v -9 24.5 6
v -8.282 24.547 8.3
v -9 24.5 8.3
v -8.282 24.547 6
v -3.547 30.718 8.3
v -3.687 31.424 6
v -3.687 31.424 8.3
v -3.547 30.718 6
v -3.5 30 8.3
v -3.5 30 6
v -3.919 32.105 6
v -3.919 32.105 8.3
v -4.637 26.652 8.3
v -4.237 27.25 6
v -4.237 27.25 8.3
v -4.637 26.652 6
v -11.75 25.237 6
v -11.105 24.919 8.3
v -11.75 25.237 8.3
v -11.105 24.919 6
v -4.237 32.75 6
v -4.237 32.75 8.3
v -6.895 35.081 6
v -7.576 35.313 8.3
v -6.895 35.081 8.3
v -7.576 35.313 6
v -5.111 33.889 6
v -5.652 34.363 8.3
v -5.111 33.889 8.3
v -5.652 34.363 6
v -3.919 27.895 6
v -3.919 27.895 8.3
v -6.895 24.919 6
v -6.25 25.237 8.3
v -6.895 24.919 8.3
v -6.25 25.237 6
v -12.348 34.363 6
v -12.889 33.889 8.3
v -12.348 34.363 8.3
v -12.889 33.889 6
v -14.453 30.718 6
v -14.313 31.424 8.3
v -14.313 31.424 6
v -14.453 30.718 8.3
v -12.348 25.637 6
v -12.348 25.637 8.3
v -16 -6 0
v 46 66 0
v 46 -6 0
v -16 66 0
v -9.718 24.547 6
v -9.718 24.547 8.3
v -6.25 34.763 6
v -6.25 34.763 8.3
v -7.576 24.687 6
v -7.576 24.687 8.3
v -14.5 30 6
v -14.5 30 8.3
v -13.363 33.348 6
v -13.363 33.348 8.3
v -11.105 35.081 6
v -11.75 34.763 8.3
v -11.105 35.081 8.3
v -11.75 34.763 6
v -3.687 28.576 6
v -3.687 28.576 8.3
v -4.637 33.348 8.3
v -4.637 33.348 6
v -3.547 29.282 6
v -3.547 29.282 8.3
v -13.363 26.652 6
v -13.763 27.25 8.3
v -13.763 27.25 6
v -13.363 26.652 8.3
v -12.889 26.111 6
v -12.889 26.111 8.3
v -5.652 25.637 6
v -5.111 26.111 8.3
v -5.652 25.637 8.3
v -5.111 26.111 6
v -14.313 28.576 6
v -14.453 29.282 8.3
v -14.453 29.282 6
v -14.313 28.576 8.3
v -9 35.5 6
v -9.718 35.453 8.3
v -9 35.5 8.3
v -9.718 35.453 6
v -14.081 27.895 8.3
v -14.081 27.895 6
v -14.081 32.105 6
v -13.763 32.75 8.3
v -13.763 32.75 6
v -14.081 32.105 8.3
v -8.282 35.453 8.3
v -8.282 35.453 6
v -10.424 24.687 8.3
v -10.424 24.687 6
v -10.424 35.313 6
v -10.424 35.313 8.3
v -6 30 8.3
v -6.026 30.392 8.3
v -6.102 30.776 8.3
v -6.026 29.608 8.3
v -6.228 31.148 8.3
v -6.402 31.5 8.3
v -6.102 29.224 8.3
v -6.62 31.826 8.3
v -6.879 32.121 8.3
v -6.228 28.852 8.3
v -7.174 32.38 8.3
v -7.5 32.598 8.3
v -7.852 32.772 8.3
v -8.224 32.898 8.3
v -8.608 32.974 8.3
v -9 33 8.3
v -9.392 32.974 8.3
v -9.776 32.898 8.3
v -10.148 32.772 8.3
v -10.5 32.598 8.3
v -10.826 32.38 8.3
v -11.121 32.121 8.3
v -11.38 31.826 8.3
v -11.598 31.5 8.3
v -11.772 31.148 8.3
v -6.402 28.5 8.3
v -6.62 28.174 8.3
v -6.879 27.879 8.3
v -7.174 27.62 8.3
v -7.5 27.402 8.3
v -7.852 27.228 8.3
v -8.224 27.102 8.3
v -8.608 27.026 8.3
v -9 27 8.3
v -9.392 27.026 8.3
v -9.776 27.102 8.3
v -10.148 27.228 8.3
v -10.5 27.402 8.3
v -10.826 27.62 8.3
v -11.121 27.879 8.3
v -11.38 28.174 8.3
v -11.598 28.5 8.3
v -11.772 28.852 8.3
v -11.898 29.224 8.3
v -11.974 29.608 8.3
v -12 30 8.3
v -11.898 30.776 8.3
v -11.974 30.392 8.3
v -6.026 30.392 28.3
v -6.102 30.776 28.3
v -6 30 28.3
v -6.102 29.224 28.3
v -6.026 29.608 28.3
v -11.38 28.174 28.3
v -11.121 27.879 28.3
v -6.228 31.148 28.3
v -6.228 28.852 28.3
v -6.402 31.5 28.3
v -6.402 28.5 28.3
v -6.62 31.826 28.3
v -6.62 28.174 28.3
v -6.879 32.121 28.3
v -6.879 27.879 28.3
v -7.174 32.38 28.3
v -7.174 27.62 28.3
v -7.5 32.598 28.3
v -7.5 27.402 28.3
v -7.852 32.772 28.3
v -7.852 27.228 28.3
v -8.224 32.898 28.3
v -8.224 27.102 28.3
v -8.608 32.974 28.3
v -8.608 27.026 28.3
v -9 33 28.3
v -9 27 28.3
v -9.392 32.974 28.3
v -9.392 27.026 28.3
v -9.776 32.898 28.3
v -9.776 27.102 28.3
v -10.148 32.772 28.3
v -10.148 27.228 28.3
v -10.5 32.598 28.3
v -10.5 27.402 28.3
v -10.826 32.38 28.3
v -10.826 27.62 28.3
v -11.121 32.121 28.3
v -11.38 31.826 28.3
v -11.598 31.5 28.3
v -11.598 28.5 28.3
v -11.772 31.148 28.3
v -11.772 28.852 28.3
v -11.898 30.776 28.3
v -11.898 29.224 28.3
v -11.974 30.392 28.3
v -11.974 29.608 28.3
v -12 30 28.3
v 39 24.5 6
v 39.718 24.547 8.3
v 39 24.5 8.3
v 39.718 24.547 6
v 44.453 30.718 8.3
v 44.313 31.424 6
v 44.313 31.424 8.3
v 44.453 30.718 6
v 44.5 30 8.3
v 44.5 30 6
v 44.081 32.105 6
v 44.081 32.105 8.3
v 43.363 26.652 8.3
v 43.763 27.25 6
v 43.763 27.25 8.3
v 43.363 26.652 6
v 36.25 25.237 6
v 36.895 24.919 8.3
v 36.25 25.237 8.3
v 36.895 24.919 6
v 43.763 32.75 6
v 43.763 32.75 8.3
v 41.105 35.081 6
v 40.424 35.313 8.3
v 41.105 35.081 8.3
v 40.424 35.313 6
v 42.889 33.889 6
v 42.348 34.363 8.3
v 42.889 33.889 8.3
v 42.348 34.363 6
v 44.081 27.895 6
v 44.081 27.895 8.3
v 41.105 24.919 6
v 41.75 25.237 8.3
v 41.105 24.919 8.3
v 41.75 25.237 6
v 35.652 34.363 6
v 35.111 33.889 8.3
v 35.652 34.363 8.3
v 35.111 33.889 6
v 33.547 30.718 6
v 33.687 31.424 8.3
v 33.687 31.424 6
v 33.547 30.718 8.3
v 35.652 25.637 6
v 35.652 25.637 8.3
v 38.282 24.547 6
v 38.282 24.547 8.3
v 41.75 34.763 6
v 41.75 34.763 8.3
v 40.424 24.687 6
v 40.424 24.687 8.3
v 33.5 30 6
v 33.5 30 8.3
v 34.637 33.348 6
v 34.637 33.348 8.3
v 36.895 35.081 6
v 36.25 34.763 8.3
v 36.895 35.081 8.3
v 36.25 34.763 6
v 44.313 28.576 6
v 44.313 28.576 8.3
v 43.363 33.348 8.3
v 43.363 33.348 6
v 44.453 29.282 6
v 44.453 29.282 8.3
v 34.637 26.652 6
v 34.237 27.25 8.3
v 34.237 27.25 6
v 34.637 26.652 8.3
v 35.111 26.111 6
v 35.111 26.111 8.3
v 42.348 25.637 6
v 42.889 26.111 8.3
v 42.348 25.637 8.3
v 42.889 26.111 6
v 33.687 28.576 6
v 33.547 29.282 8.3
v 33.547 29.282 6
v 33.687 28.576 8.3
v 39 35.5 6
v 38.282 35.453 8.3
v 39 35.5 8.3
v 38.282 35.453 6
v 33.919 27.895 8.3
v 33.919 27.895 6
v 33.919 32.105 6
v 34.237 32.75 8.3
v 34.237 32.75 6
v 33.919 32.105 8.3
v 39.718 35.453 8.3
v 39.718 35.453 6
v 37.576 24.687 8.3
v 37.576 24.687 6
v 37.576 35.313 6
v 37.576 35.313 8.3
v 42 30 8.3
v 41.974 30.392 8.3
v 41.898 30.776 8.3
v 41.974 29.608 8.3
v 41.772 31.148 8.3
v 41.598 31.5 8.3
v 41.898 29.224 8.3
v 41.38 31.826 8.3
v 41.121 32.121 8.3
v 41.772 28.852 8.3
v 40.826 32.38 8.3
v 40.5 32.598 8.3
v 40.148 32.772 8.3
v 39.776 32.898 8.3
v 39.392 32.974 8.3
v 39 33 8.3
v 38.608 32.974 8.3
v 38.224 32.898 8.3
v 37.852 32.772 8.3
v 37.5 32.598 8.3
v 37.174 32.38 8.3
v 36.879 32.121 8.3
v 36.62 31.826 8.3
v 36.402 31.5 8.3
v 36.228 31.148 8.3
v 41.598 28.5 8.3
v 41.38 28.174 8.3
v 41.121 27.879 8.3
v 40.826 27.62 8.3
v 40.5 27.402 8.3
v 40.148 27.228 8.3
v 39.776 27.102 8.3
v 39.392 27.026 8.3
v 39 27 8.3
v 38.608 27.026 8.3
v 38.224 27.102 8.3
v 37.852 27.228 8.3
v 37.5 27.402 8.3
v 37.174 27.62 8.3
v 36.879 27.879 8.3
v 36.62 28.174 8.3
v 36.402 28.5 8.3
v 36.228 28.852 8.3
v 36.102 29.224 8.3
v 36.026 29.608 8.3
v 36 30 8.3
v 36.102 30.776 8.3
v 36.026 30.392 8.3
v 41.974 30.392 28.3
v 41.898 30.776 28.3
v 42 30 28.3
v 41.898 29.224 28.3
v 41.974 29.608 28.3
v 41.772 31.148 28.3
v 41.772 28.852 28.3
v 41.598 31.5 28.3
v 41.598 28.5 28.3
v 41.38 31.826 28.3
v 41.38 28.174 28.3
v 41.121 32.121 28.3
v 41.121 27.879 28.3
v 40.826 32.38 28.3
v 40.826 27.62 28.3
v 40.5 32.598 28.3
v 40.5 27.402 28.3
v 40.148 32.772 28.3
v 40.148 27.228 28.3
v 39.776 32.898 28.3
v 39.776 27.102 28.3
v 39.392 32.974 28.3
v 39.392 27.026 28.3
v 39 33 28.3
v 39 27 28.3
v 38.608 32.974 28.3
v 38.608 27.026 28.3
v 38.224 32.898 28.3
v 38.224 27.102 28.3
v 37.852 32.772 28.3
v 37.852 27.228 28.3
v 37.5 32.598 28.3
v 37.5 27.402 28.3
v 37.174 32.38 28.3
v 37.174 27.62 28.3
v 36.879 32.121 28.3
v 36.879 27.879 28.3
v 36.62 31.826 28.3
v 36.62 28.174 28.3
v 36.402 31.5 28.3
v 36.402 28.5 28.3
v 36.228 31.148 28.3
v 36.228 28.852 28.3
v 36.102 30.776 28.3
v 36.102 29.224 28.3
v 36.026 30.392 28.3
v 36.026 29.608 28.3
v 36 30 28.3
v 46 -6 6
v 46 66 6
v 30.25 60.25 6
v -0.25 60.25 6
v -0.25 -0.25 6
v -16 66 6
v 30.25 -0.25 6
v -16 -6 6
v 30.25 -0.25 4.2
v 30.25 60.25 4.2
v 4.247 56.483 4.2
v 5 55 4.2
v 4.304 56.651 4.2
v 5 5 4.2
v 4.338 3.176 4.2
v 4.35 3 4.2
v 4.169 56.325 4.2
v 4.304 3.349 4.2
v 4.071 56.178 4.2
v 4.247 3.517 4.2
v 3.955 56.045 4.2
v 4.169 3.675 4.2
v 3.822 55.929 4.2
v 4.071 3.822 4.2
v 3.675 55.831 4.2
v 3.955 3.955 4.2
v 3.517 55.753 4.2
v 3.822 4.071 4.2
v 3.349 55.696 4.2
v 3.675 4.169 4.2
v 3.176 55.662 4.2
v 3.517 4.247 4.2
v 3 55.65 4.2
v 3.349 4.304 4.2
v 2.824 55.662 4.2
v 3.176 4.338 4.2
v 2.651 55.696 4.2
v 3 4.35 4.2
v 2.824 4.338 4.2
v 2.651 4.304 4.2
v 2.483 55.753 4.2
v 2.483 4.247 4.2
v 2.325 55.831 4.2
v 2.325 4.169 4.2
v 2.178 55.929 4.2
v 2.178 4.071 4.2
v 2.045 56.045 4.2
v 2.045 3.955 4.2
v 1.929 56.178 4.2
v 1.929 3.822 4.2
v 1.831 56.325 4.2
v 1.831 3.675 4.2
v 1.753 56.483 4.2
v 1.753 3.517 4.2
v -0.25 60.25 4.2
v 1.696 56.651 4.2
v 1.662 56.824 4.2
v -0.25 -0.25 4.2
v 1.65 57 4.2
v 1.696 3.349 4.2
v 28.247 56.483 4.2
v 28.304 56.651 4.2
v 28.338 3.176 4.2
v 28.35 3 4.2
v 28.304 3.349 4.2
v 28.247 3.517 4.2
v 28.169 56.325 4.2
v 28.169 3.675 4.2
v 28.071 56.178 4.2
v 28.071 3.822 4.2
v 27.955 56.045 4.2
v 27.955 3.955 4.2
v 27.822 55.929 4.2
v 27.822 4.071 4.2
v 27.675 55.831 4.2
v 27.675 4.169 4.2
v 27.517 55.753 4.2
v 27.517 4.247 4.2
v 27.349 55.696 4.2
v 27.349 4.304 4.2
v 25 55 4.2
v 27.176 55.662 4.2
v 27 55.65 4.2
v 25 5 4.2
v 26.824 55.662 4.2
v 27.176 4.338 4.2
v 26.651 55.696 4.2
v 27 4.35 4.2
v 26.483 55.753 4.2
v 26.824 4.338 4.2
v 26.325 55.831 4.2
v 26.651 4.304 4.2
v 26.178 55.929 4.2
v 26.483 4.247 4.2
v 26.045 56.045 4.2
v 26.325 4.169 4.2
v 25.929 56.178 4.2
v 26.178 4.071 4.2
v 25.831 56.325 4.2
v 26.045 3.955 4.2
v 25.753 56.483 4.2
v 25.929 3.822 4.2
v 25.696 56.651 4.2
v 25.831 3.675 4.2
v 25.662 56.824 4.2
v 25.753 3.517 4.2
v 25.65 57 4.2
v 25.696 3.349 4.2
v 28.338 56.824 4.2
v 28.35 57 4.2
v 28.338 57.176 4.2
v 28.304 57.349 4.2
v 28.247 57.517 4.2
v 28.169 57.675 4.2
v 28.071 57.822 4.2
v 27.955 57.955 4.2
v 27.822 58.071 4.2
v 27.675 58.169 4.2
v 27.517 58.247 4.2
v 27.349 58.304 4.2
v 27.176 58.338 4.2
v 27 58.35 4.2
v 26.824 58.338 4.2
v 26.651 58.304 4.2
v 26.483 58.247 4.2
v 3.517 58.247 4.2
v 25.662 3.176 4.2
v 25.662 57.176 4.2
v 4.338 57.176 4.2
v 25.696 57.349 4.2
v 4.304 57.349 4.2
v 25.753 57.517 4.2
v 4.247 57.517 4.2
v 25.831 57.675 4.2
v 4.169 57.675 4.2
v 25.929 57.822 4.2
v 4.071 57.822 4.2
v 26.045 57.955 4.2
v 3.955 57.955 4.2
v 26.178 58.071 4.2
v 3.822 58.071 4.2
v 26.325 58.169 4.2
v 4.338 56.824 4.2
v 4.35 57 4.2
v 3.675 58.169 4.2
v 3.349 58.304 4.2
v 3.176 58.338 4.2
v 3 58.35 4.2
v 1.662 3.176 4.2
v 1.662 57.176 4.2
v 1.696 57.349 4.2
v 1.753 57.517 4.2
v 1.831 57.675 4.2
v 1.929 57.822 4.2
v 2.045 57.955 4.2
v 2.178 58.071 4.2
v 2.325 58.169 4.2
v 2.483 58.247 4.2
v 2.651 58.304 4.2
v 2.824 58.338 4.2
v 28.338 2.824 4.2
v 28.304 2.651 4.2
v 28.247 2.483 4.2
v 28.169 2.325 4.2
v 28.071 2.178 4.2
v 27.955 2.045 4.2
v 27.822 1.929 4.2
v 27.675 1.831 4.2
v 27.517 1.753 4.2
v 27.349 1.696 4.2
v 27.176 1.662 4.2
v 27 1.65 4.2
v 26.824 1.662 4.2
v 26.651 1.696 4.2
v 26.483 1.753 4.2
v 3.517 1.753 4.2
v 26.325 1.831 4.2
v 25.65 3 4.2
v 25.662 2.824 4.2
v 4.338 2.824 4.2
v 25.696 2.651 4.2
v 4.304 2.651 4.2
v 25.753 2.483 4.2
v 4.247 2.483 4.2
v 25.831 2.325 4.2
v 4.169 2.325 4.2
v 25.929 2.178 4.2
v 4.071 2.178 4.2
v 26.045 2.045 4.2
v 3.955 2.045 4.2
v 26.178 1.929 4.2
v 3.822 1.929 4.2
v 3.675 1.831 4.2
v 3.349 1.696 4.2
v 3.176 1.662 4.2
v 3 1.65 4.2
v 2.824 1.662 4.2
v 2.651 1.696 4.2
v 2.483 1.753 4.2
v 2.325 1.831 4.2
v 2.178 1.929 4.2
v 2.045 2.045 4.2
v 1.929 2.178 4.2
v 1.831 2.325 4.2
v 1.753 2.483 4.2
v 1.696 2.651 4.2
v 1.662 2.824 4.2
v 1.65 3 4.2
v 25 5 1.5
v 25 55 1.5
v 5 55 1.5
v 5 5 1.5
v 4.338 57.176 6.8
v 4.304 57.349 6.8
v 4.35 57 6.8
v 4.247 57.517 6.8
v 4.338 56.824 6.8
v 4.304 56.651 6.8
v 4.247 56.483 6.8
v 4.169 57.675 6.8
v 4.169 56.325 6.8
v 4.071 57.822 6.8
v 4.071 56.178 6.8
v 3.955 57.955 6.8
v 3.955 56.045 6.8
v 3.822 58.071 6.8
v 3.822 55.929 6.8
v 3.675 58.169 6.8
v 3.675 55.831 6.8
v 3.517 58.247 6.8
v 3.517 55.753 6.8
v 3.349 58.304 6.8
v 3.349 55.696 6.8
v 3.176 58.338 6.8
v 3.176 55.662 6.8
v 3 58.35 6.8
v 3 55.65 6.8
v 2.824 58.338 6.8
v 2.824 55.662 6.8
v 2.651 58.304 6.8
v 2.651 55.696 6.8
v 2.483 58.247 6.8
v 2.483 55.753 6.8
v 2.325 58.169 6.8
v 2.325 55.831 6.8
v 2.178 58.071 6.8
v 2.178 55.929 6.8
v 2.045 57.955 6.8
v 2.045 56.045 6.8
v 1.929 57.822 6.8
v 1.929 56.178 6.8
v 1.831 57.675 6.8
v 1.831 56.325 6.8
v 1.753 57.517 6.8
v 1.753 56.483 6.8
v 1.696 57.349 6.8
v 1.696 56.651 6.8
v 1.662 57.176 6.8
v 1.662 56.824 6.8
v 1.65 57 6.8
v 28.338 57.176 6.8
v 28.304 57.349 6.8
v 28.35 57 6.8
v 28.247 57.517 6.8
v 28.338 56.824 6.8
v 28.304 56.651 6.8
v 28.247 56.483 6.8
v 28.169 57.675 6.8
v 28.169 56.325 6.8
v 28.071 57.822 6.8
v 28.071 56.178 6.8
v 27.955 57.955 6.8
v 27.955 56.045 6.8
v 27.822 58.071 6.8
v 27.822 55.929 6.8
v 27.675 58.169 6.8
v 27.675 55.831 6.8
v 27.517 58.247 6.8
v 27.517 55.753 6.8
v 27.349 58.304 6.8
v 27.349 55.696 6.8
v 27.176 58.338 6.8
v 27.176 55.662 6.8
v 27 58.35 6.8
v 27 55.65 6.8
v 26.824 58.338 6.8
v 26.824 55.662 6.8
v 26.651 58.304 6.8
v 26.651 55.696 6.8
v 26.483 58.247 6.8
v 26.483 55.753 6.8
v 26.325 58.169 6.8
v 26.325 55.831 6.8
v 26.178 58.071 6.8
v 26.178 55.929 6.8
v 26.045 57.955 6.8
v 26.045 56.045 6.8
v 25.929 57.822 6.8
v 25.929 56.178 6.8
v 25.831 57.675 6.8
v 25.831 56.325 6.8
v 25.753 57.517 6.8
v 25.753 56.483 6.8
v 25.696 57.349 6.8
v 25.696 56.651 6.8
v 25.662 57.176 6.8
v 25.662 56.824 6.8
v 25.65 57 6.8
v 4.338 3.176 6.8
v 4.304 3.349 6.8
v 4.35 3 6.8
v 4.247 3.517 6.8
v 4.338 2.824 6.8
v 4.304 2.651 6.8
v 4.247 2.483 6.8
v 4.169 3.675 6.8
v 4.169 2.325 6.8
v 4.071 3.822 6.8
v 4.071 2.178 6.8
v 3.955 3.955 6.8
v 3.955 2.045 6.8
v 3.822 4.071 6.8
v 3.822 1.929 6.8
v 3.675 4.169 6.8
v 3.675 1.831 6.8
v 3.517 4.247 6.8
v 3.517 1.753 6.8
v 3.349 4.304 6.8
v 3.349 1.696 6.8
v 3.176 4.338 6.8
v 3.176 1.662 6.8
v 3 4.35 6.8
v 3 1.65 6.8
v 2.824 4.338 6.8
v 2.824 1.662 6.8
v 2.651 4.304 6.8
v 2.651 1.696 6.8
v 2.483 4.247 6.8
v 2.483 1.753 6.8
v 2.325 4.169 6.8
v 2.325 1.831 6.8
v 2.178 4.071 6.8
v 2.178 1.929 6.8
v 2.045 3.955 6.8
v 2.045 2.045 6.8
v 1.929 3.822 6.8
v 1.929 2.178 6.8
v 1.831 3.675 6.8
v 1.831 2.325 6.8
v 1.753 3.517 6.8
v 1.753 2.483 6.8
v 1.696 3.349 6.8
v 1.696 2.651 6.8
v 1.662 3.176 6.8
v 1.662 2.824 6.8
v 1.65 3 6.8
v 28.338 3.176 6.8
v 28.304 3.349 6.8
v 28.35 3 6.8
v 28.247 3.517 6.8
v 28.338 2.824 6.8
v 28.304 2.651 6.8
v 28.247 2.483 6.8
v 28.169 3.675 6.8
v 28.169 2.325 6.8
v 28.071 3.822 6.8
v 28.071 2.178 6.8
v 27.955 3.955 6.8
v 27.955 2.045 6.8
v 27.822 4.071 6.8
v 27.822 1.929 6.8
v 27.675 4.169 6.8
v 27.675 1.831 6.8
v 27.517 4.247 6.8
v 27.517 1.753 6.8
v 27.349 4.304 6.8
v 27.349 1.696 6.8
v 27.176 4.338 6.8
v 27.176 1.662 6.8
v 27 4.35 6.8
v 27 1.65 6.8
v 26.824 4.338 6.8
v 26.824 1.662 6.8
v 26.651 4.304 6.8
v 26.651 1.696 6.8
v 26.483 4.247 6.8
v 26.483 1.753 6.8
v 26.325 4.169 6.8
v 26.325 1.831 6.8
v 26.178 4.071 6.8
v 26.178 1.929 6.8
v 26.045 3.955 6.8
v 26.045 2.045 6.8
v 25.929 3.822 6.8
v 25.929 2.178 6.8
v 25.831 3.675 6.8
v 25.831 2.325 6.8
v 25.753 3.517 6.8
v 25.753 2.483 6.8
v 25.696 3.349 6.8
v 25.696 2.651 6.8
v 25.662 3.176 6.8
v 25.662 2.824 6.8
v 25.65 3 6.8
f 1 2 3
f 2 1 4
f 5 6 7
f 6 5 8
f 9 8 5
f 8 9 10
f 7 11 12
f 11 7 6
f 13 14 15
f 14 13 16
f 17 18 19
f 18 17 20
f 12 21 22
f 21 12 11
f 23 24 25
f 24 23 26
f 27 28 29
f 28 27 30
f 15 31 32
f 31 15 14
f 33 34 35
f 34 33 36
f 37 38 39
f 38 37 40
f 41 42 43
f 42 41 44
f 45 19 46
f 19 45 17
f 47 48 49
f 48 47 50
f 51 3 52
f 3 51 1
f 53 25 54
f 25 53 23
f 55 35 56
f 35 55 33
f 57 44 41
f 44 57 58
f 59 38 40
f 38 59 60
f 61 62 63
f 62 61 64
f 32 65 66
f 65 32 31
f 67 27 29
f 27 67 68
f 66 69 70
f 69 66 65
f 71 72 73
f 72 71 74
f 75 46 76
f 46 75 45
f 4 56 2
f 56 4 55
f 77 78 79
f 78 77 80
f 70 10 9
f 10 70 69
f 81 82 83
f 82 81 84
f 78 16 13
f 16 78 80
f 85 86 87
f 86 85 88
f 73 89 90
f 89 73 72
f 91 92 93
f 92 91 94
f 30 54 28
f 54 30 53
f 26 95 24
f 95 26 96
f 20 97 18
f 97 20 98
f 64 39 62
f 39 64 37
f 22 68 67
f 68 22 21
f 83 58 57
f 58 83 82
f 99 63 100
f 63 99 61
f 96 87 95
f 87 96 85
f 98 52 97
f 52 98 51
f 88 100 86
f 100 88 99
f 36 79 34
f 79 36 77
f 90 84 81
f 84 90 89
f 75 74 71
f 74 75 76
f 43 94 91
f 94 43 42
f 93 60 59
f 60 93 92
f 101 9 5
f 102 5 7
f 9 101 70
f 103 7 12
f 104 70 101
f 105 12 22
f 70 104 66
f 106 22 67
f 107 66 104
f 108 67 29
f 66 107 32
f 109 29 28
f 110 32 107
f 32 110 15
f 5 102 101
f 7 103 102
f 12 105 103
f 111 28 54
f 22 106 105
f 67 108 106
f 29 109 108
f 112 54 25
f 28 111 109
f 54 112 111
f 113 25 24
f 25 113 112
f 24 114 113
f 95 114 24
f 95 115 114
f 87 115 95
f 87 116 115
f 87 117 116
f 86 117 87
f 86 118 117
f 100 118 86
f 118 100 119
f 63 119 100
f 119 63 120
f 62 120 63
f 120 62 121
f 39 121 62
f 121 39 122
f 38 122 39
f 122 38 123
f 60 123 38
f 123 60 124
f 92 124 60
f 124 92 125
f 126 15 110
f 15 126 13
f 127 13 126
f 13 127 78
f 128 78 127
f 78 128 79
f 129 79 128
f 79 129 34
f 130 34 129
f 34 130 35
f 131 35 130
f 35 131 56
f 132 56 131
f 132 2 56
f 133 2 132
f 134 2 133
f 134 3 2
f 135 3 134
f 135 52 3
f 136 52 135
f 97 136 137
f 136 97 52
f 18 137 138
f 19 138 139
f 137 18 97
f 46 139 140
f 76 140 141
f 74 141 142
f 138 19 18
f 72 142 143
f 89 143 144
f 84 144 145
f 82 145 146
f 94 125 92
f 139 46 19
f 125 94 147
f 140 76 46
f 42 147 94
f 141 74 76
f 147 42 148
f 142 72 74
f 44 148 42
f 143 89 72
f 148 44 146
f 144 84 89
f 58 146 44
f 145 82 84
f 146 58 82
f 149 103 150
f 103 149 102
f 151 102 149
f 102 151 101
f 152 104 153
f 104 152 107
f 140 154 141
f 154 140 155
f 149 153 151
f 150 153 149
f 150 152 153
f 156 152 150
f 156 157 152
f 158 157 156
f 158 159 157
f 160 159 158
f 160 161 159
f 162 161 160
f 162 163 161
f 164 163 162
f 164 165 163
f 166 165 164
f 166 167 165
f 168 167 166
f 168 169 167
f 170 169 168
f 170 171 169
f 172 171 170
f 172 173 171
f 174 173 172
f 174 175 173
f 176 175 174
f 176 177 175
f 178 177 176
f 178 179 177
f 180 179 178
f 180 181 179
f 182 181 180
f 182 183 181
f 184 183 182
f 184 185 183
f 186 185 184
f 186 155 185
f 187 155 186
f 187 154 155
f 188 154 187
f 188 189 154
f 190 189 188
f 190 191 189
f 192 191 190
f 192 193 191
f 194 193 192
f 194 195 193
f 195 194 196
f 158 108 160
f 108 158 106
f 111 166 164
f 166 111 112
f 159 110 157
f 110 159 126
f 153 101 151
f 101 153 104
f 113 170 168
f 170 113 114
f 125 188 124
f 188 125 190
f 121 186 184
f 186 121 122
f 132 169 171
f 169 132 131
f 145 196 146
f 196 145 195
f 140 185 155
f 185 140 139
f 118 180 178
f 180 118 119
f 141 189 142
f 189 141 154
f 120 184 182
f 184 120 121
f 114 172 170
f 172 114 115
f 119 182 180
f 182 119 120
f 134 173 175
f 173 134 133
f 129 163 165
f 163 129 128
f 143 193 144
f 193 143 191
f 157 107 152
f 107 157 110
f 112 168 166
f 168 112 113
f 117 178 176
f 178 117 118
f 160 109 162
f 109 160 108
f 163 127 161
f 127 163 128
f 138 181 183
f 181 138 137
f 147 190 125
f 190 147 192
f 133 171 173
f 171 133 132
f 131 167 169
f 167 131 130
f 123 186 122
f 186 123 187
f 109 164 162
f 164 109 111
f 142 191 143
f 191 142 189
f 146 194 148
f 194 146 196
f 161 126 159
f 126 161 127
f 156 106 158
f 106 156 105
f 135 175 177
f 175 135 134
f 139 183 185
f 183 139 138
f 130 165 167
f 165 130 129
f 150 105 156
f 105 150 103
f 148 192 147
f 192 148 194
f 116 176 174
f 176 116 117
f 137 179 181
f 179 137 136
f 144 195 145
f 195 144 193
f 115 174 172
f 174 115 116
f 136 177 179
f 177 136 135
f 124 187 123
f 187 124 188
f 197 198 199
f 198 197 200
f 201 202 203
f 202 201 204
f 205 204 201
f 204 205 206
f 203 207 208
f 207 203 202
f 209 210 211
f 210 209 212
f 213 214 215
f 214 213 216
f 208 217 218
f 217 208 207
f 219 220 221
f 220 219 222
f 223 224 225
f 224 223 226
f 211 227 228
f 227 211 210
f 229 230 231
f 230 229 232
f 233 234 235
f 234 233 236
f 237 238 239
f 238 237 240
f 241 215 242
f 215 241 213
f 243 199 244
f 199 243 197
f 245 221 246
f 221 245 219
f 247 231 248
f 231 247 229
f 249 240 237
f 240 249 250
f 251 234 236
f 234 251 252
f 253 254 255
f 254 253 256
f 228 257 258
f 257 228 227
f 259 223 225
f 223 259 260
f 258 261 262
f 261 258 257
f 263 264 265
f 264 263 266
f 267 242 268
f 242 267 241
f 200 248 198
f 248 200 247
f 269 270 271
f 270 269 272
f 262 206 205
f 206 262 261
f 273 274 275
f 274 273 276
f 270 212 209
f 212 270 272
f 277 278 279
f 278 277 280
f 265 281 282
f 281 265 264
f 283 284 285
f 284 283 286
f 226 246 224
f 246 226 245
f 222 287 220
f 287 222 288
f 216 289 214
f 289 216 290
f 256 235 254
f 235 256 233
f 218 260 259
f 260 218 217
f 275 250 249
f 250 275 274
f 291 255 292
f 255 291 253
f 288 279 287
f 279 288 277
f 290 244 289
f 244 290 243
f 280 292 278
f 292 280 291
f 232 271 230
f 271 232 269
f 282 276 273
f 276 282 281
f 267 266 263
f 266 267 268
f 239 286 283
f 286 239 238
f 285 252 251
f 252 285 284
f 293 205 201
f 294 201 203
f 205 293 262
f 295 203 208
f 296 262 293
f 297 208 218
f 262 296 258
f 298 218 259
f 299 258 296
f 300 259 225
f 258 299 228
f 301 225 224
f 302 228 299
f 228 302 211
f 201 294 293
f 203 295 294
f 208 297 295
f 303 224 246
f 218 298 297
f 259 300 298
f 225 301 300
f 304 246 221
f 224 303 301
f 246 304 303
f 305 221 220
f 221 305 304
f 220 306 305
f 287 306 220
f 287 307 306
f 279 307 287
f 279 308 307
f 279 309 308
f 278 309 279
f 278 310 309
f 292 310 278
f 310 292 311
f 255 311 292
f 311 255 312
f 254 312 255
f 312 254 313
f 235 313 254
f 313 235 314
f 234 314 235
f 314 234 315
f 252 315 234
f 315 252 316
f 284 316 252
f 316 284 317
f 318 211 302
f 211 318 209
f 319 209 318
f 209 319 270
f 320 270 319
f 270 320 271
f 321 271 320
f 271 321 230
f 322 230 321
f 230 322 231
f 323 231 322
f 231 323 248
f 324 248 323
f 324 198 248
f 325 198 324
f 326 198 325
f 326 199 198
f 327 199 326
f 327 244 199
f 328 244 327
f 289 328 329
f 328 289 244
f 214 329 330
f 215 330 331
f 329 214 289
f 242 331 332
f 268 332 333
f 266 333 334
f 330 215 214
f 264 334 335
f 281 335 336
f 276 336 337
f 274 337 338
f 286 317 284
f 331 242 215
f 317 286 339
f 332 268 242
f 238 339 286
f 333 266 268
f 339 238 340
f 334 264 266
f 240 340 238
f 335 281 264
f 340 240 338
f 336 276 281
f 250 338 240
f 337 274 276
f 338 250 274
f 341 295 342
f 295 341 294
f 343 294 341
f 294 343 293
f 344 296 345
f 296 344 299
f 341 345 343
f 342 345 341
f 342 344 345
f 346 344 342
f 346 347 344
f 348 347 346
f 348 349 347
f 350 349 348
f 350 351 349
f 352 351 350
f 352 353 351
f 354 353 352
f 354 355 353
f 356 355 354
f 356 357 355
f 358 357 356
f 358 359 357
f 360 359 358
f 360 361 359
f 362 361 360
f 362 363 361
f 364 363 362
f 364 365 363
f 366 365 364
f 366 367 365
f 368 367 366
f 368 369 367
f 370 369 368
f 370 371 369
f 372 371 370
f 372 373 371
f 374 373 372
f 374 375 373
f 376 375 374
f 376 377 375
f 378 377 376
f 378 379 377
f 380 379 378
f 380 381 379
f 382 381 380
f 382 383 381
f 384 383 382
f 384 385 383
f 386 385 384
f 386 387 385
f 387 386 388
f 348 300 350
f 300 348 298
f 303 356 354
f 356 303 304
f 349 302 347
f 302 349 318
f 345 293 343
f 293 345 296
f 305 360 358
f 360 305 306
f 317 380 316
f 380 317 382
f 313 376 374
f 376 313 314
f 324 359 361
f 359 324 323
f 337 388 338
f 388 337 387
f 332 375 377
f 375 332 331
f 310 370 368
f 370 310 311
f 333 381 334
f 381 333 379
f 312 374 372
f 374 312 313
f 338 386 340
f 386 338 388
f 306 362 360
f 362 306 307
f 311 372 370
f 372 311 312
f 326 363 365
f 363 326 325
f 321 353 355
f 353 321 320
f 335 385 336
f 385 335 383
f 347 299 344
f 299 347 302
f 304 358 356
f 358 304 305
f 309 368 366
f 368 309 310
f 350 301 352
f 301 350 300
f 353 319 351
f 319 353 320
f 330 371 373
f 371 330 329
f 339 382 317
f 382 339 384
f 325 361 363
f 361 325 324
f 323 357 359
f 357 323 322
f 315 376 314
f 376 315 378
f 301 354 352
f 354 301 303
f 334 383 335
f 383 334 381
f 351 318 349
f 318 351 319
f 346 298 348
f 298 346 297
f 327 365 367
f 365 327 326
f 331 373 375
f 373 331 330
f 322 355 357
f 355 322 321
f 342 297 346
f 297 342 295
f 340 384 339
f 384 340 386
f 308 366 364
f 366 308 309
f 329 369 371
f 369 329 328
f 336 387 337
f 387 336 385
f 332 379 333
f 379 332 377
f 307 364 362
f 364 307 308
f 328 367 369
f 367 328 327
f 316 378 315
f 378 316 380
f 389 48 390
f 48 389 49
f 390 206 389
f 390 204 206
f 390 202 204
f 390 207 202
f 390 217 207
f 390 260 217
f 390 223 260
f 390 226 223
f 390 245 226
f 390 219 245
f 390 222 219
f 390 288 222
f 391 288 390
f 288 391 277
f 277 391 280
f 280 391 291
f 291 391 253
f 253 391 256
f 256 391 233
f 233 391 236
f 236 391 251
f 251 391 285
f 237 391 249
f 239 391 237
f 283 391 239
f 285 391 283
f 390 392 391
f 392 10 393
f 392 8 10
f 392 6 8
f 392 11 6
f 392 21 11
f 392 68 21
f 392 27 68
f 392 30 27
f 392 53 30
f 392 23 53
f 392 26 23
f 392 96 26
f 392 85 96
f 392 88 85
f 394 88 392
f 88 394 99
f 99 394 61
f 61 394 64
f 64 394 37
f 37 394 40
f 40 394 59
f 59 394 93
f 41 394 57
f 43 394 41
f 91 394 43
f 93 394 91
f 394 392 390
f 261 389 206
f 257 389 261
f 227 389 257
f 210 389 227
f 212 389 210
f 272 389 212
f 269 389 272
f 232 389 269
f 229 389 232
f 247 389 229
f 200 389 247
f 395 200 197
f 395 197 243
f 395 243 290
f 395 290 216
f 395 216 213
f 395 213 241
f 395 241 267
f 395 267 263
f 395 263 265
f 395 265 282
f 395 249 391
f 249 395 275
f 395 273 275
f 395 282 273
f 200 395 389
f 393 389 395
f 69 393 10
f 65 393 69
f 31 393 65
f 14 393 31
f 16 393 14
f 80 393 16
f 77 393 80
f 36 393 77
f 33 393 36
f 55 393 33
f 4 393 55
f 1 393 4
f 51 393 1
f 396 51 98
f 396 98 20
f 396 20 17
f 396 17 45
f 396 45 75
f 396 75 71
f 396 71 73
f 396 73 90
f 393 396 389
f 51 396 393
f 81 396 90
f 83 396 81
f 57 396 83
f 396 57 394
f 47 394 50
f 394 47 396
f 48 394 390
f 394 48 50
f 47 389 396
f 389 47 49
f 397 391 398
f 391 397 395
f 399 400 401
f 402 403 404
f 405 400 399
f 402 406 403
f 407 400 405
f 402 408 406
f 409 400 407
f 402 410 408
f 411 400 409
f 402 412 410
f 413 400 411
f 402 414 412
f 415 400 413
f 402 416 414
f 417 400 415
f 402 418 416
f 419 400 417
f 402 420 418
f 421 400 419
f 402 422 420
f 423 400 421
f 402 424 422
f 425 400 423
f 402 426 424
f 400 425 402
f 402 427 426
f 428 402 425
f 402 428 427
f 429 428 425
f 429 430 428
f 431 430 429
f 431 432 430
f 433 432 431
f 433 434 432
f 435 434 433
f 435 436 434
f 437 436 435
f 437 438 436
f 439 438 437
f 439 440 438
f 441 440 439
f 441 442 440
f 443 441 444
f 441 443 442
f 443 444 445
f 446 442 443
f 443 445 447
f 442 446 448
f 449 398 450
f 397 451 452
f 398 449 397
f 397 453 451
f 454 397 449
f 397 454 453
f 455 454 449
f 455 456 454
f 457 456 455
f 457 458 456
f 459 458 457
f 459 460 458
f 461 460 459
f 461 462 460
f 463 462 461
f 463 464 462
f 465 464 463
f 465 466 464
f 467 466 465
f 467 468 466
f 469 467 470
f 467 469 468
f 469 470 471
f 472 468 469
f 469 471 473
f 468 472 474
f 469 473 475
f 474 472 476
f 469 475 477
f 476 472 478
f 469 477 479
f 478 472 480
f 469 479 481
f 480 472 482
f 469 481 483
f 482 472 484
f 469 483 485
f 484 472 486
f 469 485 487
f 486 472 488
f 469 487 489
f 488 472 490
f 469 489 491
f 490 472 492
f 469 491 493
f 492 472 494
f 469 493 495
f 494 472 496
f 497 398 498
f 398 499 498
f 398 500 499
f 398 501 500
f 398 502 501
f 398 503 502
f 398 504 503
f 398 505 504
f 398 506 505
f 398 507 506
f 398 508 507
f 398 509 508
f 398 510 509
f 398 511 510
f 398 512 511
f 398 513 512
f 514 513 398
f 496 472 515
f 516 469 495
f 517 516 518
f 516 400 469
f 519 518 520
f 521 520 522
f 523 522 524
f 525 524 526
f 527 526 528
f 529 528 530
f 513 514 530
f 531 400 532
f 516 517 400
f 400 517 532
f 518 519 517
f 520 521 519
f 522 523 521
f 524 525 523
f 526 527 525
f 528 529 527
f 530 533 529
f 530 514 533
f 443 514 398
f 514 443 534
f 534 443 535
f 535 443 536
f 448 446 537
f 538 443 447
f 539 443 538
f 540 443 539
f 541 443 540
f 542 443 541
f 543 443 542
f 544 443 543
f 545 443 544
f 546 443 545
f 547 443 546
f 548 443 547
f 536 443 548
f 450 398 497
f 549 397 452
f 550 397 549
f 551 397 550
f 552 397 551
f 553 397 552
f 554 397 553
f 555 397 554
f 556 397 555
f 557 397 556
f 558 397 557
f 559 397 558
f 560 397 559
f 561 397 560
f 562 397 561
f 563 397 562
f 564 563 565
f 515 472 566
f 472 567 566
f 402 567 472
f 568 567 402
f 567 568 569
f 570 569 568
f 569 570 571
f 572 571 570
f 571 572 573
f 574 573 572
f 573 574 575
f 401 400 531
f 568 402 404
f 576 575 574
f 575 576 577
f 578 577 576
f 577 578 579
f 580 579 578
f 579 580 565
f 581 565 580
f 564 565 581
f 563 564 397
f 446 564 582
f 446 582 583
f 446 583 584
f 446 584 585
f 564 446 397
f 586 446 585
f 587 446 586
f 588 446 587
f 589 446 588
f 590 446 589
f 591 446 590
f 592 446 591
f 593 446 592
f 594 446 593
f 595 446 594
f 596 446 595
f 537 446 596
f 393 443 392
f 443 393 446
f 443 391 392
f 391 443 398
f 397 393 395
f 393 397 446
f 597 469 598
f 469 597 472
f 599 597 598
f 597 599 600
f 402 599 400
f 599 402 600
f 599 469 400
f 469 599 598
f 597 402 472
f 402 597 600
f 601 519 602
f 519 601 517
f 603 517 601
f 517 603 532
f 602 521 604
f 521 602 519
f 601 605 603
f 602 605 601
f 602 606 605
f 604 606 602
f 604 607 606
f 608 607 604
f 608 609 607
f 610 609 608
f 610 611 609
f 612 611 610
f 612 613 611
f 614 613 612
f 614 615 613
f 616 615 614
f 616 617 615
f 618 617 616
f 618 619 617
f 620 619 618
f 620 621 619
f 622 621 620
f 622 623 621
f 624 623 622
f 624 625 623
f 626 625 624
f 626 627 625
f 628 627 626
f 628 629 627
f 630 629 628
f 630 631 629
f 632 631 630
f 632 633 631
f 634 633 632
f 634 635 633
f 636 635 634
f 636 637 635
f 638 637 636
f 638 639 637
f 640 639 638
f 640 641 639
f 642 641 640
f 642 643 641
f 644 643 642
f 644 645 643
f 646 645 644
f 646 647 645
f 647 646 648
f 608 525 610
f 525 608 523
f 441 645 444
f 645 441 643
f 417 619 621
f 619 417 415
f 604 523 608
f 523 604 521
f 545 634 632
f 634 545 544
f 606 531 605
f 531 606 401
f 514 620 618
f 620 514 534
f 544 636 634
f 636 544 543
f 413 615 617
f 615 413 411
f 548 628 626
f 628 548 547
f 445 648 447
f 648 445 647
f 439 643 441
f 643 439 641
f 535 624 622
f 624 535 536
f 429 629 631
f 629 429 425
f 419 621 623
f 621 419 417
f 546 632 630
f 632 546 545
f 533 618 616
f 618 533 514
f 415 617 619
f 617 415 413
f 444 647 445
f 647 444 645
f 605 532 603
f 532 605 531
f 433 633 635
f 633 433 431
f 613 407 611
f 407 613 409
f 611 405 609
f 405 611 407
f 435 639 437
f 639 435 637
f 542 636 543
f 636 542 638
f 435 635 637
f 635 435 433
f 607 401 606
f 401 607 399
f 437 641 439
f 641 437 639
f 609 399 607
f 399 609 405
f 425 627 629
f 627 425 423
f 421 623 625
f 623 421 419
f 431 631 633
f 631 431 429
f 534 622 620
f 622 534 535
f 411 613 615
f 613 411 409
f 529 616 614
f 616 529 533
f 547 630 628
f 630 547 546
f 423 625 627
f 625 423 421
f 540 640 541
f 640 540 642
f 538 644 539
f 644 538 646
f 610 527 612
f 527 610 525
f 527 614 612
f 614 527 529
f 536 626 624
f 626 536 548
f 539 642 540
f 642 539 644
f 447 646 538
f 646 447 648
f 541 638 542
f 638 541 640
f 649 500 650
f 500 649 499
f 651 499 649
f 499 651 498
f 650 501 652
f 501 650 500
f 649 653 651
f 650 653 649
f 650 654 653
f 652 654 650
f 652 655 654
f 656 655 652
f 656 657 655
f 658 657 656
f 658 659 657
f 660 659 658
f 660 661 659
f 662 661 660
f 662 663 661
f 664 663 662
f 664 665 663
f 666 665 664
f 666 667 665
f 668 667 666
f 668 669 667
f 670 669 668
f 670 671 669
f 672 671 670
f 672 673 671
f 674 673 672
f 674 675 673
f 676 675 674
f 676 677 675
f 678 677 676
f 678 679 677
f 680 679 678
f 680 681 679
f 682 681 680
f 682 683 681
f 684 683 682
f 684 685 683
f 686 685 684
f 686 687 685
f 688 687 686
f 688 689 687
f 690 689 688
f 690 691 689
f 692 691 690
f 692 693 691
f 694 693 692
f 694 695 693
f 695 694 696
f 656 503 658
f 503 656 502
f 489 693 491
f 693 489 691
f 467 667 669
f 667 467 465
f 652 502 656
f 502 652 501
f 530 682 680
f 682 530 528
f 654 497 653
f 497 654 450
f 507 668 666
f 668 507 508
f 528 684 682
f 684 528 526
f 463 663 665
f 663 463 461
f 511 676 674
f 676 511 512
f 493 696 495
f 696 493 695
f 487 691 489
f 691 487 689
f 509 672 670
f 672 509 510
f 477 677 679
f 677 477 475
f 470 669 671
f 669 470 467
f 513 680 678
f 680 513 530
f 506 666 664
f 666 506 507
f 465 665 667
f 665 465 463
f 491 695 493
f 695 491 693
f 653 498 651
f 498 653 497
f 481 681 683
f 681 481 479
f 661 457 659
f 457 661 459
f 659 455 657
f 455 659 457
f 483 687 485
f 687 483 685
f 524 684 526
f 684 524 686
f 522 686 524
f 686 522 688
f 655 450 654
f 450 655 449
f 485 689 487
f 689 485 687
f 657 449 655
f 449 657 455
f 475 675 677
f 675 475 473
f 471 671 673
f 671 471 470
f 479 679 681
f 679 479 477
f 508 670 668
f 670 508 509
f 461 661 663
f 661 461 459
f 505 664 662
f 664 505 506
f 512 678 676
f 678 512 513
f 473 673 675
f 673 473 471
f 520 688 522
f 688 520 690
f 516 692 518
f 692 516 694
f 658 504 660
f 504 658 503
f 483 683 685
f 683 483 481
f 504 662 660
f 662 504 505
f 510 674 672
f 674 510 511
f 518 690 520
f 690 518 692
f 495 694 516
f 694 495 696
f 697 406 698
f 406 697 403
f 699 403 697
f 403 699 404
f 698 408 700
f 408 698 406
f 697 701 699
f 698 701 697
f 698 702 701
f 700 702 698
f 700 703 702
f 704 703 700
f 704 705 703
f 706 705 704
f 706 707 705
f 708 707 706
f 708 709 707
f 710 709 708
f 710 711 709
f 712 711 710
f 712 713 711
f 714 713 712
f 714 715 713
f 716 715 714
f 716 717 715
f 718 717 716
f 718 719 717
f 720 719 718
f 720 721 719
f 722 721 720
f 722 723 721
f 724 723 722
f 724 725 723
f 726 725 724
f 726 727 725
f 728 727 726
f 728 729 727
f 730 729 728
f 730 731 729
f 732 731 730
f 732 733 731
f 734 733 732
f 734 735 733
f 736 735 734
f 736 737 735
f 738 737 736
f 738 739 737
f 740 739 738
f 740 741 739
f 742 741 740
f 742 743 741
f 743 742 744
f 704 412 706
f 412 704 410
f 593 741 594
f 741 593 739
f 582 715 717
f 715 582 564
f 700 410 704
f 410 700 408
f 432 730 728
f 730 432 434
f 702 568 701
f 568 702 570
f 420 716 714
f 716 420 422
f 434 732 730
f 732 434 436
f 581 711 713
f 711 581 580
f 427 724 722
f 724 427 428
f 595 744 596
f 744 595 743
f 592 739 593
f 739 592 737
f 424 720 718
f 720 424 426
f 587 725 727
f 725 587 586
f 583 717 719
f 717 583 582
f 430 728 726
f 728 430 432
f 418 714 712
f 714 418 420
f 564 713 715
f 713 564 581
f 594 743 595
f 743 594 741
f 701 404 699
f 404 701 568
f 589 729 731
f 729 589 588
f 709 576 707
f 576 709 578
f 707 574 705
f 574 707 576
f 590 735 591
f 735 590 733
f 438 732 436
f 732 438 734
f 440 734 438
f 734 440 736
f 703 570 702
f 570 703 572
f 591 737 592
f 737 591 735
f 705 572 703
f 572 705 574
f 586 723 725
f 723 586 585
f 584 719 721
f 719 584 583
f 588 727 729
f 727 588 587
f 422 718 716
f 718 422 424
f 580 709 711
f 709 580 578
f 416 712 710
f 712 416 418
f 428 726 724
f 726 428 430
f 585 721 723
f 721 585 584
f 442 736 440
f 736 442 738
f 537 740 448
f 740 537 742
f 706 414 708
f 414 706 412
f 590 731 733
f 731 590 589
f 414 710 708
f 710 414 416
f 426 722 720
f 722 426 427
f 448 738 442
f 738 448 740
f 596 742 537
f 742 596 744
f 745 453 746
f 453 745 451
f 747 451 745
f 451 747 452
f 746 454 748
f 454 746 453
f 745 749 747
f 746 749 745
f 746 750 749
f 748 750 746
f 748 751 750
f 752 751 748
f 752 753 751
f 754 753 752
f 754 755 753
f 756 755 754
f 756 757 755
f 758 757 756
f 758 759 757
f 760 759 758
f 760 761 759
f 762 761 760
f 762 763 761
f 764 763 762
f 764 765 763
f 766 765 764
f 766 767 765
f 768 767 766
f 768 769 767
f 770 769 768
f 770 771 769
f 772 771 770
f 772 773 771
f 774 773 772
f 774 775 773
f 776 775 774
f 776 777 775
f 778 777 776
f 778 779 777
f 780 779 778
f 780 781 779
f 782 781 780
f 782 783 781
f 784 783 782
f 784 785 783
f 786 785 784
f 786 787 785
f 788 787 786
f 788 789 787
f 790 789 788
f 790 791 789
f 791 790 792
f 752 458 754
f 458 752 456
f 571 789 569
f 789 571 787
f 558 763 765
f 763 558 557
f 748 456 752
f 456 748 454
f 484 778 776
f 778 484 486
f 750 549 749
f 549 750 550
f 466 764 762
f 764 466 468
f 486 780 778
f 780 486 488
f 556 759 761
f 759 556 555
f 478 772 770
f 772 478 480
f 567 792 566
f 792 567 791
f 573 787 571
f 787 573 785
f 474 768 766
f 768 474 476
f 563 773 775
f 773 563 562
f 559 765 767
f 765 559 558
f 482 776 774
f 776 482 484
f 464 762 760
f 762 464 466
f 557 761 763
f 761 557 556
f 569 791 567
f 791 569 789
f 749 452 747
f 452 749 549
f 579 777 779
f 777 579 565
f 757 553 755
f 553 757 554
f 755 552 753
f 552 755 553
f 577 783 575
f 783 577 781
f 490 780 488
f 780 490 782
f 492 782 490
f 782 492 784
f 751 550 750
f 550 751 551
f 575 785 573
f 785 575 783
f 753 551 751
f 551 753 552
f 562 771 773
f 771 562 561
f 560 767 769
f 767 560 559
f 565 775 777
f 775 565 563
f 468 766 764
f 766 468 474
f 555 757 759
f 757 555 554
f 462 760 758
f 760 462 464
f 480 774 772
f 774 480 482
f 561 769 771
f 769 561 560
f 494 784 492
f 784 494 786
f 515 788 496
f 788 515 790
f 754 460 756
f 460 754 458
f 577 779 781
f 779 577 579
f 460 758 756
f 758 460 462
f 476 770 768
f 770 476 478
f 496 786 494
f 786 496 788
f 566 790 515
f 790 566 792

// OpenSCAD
// ============================================================
// Flash-and-Address Programming Jig — Split Flap Driver V4
// ============================================================
// Two printed parts: a base cradle that registers the board on
// its corner holes, and a press head riding on two guide posts,
// carrying 7 spring (pogo) pins that land on the board's UPDI
// header holes and the four bus pogo-pin holes.
//
// Coordinates extracted from SplitFlapDriverATtiny1616V4.kicad_pcb.
// Board space: origin at board TOP-LEFT corner (silkscreen upright,
// component side up), X right, Y downward — same as the KiCad sheet.
//
// Choose what to render:
part = "base";      // "base" | "head" | "coupon" | "assembly"

// ---- Board facts (fixed by the PCB design) ------------------
board_w   = 30;     // X extent, mm
board_l   = 60;     // Y extent, mm
board_t   = 1.6;    // PCB thickness

// Corner registration holes: dia 3.0 at 3 mm in from each corner
corner_holes = [[3,3],[27,3],[3,57],[27,57]];

// Contact targets (all dia 1.0 plated through-holes)
// UPDI header: +3V3 is unused (board powered via 12V pad)
contacts = [
  [15.35,  6.80],   // UPDI GND
  [17.89,  6.80],   // UPDI data
  [15.00, 22.35],   // +12V
  [15.00, 28.10],   // RS-485 B
  [15.00, 31.90],   // RS-485 A
  [15.00, 37.65],   // GND
];

// ---- Tunables ----------------------------------------------
pogo_hole_d   = 1.3;   // press-fit hole for pogo barrel — CALIBRATE WITH COUPON
pogo_protrude = 4;     // pogo tip below head underside, uncompressed
pogo_travel   = 1.5;   // compression when head is bottomed on stops
peg_d         = 2.7;   // registration peg dia (clearance in 3.0 board hole)
pocket_clr    = 0.25;  // board pocket clearance per side
ledge_w       = 5;     // perimeter shelf the board rests on
base_t        = 6;     // base plate thickness
head_t        = 8;     // press-head thickness
post_d        = 6;     // guide post dia
post_hole_clr = 0.25;  // head-to-post clearance per side
plate_margin  = 6;     // base material around the pocket
post_offset   = 9;     // post center distance from board edge
$fn = 48;

// ---- Derived -----------------------------------------------
pocket_w = board_w + 2*pocket_clr;
pocket_l = board_l + 2*pocket_clr;
ledge_z  = base_t - board_t - 0.2;        // shelf height: board top sits ~0.2 below base top
plate_w  = board_w + 2*(post_offset + post_d/2 + 4);
plate_l  = board_l + 2*plate_margin;
post_x   = [-post_offset, board_w + post_offset];
post_y   = board_l/2;
board_top    = ledge_z + board_t;
stop_top     = board_top + pogo_protrude - pogo_travel;  // head underside lands here
shoulder_d   = post_d + 5;
post_h       = stop_top + head_t + 12;

// board-space -> model-space (flip Y so silkscreen-up matches print)
function bs(p) = [p[0], board_l - p[1]];

module at_each(pts) { for (p = pts) translate(bs(p)) children(); }

// ============================================================
module base() {
  difference() {
    union() {
      // plate
      translate([-(plate_w-board_w)/2, -plate_margin, 0])
        cube([plate_w, plate_l, base_t]);
      // guide posts with stop shoulders
      for (x = post_x) translate([x, post_y, 0]) {
        cylinder(d=shoulder_d, h=stop_top);
        cylinder(d=post_d, h=post_h);
      }
    }
    // board pocket
    translate([-pocket_clr, -pocket_clr, ledge_z])
      cube([pocket_w, pocket_l, base_t]);
    // central void so through-hole solder tails hang free
    translate([ledge_w, ledge_w, 1.5])
      cube([board_w - 2*ledge_w, board_l - 2*ledge_w, base_t]);
  }
  // registration pegs (on the shelf, through the board, 1 mm proud)
  at_each(corner_holes)
    cylinder(d=peg_d, h=ledge_z + board_t + 1);
}

// ============================================================
module head() {
  difference() {
    translate([-(plate_w-board_w)/2, -plate_margin, 0])
      cube([plate_w, plate_l, head_t]);
    // guide holes
    for (x = post_x) translate([x, post_y, -1])
      cylinder(d=post_d + 2*post_hole_clr, h=head_t + 2);
    // pogo press-fit holes with wire counterbores from the top
    at_each(contacts) {
      translate([0,0,-1]) cylinder(d=pogo_hole_d, h=head_t + 2);
      translate([0,0,3])  cylinder(d=3.5, h=head_t);        // solder/wire well
    }
    // peg clearance dimples
    at_each(corner_holes)
      translate([0,0,-1]) cylinder(d=4, h=3);
    // wire channel: UPDI pair across to the bus column, then out the +Y edge
    translate([13.5, bs([15.00, 6.80])[1] - 1.75, head_t-2]) cube([6, 3.5, 3]);
    translate([13.25, bs([15.00, 37.65])[1] - 1.75, head_t-2])
      cube([3.5, 37.65 + 1.75 + plate_margin + 1, 3]);   // runs past the UPDI channel and out the plate edge
  }
}

// ============================================================
// Print, then find the tightest hole your pogo barrel presses into
module coupon() {
  n = 7;
  difference() {
    cube([n*8 + 4, 14, 6]);
    for (i = [0:n-1]) {
      d = 1.0 + i*0.1;
      translate([8 + i*8, 7, -1]) cylinder(d=d, h=8);
    }
  }
  for (i = [0:n-1])
    translate([8 + i*8 - 3, 0.6, 6])
      linear_extrude(0.4) text(str(1.0 + i*0.1), size=2.6);
}

// ============================================================
if (part == "base")   base();
if (part == "head")   head();
if (part == "coupon") coupon();
if (part == "assembly") {
  base();
  %translate([0, 0, ledge_z]) cube([board_w, board_l, board_t]);
  translate([0, 0, stop_top]) head();
}
